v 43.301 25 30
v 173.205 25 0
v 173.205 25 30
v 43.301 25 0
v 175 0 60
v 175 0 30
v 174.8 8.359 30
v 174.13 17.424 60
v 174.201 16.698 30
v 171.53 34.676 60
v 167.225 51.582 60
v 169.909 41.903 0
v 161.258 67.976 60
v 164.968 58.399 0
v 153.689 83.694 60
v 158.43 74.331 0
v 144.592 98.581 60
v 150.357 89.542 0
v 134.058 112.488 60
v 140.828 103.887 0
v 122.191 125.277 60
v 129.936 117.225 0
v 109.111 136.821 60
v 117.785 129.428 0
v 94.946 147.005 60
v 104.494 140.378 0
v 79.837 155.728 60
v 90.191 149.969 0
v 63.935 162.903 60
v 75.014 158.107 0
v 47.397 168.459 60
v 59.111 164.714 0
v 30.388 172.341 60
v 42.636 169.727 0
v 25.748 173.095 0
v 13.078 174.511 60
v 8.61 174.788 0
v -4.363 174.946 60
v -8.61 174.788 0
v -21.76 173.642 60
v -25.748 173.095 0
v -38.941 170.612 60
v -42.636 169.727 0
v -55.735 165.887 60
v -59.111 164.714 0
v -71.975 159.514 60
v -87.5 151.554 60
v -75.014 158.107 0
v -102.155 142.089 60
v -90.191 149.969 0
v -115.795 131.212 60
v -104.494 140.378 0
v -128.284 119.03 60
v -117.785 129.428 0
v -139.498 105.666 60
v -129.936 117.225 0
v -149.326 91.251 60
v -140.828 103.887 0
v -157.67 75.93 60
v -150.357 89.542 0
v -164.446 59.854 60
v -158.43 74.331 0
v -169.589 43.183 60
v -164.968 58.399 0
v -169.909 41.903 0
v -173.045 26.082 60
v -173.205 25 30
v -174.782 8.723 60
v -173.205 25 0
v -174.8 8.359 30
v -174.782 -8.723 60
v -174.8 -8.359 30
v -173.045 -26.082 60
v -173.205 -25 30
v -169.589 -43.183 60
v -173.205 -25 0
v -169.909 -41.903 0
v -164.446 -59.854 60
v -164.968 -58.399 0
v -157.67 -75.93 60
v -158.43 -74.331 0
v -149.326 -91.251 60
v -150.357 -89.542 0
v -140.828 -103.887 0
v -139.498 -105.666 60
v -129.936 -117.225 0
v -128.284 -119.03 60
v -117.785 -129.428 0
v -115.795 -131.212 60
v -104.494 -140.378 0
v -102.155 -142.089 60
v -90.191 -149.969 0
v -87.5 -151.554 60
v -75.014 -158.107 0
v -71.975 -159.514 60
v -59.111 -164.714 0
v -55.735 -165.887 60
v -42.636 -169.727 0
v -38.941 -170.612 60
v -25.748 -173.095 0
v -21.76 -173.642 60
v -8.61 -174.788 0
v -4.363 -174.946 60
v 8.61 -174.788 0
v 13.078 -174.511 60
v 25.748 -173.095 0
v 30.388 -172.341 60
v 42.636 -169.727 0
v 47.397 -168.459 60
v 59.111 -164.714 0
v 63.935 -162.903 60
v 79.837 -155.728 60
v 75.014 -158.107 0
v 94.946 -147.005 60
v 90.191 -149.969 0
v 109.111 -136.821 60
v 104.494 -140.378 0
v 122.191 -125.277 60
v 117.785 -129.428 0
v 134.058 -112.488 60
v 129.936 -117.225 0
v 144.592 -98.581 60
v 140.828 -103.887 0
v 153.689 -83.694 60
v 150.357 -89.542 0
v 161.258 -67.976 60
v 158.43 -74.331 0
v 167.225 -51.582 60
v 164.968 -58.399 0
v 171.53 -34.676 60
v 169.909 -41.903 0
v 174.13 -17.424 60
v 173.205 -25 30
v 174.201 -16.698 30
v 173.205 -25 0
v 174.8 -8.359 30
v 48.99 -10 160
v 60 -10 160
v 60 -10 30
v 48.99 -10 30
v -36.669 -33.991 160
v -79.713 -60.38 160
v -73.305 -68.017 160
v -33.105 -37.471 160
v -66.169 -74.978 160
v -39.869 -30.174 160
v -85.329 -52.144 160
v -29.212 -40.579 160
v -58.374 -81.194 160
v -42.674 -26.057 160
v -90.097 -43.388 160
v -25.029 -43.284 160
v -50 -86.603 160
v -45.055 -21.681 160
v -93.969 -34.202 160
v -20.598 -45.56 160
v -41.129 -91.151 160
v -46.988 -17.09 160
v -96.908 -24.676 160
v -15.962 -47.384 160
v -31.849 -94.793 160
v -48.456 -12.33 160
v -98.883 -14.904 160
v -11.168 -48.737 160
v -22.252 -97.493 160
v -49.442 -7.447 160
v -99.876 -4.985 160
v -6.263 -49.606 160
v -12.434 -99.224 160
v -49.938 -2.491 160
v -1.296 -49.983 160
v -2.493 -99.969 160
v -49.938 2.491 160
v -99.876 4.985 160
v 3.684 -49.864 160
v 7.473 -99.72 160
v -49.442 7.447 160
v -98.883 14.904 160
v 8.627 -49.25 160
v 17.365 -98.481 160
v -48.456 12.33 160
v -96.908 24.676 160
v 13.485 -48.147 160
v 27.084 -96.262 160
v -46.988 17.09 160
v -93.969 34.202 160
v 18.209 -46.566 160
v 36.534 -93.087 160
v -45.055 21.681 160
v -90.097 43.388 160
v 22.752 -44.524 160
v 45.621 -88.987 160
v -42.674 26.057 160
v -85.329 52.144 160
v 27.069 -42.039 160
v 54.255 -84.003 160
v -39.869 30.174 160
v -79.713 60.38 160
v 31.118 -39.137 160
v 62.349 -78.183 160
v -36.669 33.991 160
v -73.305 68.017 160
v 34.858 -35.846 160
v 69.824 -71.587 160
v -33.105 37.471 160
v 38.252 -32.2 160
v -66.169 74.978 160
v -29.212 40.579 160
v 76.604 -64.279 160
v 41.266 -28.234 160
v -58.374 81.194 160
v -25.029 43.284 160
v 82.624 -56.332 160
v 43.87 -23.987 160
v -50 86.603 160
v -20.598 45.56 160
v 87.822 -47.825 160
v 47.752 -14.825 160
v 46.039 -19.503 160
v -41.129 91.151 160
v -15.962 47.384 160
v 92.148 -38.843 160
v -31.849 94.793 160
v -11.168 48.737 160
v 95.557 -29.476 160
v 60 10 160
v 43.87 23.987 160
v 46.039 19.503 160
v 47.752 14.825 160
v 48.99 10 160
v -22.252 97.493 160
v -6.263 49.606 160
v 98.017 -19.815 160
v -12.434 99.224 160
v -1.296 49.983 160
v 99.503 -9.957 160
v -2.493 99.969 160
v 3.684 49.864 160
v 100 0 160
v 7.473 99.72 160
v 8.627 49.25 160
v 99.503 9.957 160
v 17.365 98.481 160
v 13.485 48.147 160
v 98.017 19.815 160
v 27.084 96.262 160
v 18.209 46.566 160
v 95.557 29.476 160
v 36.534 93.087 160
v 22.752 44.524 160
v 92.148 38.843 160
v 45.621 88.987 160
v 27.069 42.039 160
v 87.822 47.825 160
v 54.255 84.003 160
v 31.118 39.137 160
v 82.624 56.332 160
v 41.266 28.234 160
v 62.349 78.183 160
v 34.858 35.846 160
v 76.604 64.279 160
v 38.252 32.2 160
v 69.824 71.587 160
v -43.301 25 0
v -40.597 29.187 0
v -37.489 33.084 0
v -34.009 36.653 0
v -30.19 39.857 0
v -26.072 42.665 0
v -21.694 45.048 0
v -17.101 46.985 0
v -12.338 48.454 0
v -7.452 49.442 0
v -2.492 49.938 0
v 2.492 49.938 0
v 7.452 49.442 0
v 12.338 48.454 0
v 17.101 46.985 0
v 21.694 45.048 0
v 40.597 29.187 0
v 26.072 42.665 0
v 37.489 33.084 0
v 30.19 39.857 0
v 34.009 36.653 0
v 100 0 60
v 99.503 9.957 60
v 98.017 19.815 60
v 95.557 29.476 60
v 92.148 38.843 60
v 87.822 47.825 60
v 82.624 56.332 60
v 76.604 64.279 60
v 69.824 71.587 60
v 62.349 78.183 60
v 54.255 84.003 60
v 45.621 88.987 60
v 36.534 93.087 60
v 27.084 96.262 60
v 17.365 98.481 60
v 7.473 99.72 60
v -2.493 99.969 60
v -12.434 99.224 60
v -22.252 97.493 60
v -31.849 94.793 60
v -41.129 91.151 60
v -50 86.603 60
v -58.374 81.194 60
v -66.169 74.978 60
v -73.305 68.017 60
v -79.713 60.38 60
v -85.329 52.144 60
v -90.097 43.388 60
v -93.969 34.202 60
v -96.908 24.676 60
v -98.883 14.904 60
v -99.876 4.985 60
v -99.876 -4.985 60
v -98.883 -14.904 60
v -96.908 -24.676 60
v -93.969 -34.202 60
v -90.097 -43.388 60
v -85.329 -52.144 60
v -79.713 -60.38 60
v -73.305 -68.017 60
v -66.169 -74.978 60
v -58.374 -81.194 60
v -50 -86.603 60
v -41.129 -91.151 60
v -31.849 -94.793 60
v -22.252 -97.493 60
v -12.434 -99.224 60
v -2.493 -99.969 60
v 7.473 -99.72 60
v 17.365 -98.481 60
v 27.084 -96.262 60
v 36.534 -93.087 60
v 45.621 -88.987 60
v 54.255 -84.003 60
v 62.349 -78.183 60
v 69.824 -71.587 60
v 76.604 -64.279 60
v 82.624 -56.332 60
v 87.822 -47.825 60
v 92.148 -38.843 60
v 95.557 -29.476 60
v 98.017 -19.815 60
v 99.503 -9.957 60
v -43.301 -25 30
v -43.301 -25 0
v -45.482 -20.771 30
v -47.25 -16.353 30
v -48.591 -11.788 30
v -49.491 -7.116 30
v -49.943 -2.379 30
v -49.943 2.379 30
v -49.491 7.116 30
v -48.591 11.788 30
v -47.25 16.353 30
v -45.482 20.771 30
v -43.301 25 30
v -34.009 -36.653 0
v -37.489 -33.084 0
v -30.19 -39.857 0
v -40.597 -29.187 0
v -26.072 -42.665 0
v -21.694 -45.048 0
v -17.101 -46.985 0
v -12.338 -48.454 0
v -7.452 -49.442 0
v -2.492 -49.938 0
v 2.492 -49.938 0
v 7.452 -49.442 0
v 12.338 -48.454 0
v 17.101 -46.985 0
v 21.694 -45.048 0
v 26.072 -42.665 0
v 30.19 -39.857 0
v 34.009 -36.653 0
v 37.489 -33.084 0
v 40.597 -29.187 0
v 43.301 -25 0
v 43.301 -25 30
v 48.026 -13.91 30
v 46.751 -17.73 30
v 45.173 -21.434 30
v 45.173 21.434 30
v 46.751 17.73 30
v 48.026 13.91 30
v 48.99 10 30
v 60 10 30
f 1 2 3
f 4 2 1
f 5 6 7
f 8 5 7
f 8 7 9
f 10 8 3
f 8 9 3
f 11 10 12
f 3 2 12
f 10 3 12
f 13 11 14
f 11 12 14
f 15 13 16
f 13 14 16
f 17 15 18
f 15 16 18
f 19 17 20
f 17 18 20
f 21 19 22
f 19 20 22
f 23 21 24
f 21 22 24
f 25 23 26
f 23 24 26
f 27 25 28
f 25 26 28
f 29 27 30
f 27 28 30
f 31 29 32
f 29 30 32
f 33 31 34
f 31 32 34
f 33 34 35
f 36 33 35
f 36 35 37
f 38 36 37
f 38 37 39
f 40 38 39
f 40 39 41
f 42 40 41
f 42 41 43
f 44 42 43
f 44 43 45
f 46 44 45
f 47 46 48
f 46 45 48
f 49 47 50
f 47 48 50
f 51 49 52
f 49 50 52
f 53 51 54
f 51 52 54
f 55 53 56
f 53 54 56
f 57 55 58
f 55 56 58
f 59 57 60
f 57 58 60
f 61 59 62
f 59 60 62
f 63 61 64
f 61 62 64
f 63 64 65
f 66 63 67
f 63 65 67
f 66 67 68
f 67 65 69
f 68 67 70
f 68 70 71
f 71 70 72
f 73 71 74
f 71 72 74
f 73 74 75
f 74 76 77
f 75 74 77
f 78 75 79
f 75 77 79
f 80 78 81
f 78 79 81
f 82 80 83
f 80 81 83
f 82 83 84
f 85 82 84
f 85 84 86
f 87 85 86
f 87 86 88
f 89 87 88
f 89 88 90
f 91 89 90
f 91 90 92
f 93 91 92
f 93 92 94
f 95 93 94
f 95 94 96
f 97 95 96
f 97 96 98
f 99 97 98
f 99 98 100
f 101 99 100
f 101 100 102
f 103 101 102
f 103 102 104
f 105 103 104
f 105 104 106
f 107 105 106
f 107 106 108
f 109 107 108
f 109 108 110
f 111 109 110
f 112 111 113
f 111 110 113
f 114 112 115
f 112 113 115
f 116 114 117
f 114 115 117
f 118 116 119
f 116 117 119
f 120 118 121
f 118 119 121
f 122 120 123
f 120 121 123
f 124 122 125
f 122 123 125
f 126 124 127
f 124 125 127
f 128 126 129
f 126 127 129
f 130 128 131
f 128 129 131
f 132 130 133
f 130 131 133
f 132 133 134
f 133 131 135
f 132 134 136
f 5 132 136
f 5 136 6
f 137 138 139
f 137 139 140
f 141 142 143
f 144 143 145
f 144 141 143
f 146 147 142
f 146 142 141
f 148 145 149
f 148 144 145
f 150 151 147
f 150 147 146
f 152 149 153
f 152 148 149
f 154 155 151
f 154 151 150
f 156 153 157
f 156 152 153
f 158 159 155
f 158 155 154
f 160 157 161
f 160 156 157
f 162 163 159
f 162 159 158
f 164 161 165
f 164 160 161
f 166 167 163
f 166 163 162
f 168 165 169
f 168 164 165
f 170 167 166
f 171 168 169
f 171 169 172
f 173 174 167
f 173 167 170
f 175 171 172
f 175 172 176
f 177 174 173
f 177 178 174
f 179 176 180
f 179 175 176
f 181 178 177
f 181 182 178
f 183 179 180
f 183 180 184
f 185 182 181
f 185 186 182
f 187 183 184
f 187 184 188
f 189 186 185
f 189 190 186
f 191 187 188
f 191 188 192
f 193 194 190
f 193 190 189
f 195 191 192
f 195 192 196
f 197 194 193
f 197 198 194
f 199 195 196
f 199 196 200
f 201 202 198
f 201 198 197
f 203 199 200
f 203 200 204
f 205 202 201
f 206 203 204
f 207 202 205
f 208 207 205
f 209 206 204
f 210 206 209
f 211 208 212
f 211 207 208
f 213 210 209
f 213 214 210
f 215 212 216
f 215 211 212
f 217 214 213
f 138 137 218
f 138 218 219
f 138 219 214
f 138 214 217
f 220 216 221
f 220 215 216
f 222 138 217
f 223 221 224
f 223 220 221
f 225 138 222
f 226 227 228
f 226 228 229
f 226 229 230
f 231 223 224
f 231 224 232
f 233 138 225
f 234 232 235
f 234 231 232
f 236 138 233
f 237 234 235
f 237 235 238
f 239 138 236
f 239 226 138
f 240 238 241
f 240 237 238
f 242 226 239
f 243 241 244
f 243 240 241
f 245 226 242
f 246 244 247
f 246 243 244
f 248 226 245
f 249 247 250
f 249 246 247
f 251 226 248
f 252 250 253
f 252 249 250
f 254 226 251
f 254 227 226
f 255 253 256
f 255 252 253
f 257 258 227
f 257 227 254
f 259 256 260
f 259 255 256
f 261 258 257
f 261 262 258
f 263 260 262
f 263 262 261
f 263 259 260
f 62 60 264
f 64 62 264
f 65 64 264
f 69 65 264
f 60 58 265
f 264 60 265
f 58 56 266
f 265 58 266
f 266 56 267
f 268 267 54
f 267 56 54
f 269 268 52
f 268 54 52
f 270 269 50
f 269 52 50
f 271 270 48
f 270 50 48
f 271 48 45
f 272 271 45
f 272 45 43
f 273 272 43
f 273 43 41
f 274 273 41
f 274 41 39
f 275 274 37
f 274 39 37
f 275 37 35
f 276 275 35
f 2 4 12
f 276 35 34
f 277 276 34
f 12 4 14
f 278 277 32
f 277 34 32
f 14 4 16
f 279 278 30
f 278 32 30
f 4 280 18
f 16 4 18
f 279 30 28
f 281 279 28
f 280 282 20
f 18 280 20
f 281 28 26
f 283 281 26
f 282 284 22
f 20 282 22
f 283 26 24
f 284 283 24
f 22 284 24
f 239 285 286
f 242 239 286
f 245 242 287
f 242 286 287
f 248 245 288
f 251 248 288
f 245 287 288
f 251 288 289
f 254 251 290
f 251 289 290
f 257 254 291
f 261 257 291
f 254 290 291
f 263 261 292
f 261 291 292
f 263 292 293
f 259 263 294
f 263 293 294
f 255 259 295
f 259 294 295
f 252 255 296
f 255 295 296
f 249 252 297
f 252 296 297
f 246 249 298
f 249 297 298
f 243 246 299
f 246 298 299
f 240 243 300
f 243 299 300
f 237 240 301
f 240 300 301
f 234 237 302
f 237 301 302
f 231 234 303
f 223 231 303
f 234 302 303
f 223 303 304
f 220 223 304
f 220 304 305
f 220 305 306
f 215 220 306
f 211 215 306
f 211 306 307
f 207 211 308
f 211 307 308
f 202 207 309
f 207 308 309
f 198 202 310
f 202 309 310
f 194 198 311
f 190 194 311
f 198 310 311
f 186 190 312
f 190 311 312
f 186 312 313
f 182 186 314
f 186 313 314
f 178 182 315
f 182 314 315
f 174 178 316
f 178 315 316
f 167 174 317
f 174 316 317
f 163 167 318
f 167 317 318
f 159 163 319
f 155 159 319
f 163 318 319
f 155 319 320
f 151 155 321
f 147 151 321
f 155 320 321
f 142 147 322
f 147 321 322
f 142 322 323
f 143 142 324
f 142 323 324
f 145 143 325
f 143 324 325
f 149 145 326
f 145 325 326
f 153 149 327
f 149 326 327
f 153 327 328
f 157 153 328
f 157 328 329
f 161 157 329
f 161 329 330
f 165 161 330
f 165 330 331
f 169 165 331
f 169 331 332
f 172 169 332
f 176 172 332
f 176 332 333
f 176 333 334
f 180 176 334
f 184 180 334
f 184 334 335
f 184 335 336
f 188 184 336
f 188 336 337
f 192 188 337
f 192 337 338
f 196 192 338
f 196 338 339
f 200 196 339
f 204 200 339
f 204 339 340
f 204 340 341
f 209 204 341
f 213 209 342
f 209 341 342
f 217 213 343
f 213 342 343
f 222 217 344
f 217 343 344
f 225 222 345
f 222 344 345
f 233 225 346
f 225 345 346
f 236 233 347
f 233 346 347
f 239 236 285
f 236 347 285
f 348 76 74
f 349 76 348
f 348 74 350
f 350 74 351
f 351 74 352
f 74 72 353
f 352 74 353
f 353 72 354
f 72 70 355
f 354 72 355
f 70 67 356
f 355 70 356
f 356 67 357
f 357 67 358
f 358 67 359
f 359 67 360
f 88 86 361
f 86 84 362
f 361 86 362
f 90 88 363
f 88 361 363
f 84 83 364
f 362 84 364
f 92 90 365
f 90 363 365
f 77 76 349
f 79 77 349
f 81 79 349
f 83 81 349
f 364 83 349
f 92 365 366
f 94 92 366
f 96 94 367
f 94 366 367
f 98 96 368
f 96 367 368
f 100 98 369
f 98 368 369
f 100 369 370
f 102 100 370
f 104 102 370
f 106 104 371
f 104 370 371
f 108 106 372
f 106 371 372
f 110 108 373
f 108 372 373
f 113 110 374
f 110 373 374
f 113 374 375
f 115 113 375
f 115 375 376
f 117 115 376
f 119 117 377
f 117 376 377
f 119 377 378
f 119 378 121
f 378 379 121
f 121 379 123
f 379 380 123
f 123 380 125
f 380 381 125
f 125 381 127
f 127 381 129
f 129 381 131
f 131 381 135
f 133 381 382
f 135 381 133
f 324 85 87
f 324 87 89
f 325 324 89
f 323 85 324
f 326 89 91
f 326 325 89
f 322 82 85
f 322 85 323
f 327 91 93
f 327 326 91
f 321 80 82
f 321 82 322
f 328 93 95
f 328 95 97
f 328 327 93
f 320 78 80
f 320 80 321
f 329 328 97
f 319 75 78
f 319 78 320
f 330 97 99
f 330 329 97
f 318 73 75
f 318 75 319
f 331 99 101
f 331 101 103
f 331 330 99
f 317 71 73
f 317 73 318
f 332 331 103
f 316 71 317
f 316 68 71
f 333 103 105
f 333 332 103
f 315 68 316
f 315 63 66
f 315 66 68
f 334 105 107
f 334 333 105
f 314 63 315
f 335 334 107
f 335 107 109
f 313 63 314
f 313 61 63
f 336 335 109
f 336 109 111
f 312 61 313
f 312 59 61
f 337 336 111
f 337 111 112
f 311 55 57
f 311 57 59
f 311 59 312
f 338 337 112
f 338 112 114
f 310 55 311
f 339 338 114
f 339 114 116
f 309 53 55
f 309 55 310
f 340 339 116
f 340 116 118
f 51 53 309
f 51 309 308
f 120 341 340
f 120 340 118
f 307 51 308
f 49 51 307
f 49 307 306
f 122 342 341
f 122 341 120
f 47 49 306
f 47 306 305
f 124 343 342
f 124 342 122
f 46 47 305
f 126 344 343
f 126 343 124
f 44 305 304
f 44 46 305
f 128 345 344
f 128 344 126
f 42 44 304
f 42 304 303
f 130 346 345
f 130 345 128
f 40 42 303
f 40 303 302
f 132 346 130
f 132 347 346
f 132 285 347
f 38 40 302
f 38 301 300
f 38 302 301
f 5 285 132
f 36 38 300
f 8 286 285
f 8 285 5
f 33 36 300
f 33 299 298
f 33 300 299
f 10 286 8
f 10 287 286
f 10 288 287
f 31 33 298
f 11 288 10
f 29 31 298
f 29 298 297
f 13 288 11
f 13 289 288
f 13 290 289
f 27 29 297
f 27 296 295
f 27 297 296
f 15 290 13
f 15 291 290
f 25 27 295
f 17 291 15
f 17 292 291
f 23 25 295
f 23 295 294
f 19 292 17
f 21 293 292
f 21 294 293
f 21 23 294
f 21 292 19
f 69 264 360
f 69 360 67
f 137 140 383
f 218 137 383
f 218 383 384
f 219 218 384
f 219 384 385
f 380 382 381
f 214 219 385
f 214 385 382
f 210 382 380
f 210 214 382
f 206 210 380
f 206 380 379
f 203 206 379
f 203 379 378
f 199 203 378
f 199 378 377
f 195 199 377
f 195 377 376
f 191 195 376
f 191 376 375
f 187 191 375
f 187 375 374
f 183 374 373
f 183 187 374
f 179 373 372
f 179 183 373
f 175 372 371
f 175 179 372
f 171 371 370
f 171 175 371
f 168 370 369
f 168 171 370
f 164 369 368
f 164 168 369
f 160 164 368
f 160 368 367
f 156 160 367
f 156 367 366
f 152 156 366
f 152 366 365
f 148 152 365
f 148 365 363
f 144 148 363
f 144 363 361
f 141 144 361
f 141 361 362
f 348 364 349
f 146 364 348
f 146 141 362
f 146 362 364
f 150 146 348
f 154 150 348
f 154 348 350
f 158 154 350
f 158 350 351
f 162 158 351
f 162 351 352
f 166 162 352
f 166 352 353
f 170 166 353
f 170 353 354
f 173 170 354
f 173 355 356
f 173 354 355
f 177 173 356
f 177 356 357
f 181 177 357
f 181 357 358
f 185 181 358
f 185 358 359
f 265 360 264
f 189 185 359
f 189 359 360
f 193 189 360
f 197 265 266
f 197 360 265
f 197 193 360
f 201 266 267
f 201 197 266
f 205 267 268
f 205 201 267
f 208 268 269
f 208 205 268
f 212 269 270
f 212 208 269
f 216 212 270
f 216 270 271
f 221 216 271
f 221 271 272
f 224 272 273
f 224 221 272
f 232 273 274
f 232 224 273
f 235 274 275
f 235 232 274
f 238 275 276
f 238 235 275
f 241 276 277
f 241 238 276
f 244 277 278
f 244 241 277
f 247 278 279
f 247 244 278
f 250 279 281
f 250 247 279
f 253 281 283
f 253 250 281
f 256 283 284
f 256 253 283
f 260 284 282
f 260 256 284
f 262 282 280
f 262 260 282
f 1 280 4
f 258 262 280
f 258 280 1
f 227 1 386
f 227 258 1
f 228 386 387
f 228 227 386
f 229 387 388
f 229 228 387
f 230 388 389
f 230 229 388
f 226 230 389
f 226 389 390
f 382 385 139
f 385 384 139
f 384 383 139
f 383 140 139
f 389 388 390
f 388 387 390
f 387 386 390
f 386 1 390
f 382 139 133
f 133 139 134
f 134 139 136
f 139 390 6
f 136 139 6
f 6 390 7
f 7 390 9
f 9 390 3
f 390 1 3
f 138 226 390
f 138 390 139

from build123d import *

# Parameters (mm, degrees)
SKETCH1_R           = 175
BOSS_EXTRUDE1_DEPTH = 60
SKETCH2_R           = 100
BOSS_EXTRUDE2_DEPTH = 100
CUT_EXTRUDE1_DEPTH  = 30
CUT_EXTRUDE2_DEPTH  = 295.703240566


with BuildPart() as part:
    # Sketch1 → Boss-Extrude1 (new body)
    with BuildSketch(Plane.XY):
        Circle(SKETCH1_R)
    extrude(amount=BOSS_EXTRUDE1_DEPTH)

    # Sketch2 → Boss-Extrude2 (add)
    with BuildSketch(Plane.XY.offset(60)):
        Circle(SKETCH2_R)
    extrude(amount=BOSS_EXTRUDE2_DEPTH)

    # Sketch4 → Cut-Extrude1 (cut)
    with BuildSketch(Plane.XY):
        with BuildLine():
            Line((173.205080757, 25), (-173.205080757, 25))
            ThreePointArc((-173.205080757, 25), (-175, 0), (-173.205080757, -25))
            Line((-173.205080757, -25), (173.205080757, -25))
            ThreePointArc((173.205080757, -25), (175, 0), (173.205080757, 25))
        make_face()
    extrude(amount=CUT_EXTRUDE1_DEPTH, mode=Mode.SUBTRACT)

    # Sketch6 → Cut-Extrude2 (cut, through all)
    with BuildSketch(Plane.XY.offset(160)):
        with BuildLine():
            Line((59.999794856, 10), (59.999794856, -10))
            Line((59.999794856, -10), (48.989794856, -10))
            ThreePointArc((48.989794856, -10), (-50, 0), (48.989794856, 10))
            Line((48.989794856, 10), (59.999794856, 10))
        make_face()
    extrude(amount=-CUT_EXTRUDE2_DEPTH, mode=Mode.SUBTRACT)


solid = part.part
